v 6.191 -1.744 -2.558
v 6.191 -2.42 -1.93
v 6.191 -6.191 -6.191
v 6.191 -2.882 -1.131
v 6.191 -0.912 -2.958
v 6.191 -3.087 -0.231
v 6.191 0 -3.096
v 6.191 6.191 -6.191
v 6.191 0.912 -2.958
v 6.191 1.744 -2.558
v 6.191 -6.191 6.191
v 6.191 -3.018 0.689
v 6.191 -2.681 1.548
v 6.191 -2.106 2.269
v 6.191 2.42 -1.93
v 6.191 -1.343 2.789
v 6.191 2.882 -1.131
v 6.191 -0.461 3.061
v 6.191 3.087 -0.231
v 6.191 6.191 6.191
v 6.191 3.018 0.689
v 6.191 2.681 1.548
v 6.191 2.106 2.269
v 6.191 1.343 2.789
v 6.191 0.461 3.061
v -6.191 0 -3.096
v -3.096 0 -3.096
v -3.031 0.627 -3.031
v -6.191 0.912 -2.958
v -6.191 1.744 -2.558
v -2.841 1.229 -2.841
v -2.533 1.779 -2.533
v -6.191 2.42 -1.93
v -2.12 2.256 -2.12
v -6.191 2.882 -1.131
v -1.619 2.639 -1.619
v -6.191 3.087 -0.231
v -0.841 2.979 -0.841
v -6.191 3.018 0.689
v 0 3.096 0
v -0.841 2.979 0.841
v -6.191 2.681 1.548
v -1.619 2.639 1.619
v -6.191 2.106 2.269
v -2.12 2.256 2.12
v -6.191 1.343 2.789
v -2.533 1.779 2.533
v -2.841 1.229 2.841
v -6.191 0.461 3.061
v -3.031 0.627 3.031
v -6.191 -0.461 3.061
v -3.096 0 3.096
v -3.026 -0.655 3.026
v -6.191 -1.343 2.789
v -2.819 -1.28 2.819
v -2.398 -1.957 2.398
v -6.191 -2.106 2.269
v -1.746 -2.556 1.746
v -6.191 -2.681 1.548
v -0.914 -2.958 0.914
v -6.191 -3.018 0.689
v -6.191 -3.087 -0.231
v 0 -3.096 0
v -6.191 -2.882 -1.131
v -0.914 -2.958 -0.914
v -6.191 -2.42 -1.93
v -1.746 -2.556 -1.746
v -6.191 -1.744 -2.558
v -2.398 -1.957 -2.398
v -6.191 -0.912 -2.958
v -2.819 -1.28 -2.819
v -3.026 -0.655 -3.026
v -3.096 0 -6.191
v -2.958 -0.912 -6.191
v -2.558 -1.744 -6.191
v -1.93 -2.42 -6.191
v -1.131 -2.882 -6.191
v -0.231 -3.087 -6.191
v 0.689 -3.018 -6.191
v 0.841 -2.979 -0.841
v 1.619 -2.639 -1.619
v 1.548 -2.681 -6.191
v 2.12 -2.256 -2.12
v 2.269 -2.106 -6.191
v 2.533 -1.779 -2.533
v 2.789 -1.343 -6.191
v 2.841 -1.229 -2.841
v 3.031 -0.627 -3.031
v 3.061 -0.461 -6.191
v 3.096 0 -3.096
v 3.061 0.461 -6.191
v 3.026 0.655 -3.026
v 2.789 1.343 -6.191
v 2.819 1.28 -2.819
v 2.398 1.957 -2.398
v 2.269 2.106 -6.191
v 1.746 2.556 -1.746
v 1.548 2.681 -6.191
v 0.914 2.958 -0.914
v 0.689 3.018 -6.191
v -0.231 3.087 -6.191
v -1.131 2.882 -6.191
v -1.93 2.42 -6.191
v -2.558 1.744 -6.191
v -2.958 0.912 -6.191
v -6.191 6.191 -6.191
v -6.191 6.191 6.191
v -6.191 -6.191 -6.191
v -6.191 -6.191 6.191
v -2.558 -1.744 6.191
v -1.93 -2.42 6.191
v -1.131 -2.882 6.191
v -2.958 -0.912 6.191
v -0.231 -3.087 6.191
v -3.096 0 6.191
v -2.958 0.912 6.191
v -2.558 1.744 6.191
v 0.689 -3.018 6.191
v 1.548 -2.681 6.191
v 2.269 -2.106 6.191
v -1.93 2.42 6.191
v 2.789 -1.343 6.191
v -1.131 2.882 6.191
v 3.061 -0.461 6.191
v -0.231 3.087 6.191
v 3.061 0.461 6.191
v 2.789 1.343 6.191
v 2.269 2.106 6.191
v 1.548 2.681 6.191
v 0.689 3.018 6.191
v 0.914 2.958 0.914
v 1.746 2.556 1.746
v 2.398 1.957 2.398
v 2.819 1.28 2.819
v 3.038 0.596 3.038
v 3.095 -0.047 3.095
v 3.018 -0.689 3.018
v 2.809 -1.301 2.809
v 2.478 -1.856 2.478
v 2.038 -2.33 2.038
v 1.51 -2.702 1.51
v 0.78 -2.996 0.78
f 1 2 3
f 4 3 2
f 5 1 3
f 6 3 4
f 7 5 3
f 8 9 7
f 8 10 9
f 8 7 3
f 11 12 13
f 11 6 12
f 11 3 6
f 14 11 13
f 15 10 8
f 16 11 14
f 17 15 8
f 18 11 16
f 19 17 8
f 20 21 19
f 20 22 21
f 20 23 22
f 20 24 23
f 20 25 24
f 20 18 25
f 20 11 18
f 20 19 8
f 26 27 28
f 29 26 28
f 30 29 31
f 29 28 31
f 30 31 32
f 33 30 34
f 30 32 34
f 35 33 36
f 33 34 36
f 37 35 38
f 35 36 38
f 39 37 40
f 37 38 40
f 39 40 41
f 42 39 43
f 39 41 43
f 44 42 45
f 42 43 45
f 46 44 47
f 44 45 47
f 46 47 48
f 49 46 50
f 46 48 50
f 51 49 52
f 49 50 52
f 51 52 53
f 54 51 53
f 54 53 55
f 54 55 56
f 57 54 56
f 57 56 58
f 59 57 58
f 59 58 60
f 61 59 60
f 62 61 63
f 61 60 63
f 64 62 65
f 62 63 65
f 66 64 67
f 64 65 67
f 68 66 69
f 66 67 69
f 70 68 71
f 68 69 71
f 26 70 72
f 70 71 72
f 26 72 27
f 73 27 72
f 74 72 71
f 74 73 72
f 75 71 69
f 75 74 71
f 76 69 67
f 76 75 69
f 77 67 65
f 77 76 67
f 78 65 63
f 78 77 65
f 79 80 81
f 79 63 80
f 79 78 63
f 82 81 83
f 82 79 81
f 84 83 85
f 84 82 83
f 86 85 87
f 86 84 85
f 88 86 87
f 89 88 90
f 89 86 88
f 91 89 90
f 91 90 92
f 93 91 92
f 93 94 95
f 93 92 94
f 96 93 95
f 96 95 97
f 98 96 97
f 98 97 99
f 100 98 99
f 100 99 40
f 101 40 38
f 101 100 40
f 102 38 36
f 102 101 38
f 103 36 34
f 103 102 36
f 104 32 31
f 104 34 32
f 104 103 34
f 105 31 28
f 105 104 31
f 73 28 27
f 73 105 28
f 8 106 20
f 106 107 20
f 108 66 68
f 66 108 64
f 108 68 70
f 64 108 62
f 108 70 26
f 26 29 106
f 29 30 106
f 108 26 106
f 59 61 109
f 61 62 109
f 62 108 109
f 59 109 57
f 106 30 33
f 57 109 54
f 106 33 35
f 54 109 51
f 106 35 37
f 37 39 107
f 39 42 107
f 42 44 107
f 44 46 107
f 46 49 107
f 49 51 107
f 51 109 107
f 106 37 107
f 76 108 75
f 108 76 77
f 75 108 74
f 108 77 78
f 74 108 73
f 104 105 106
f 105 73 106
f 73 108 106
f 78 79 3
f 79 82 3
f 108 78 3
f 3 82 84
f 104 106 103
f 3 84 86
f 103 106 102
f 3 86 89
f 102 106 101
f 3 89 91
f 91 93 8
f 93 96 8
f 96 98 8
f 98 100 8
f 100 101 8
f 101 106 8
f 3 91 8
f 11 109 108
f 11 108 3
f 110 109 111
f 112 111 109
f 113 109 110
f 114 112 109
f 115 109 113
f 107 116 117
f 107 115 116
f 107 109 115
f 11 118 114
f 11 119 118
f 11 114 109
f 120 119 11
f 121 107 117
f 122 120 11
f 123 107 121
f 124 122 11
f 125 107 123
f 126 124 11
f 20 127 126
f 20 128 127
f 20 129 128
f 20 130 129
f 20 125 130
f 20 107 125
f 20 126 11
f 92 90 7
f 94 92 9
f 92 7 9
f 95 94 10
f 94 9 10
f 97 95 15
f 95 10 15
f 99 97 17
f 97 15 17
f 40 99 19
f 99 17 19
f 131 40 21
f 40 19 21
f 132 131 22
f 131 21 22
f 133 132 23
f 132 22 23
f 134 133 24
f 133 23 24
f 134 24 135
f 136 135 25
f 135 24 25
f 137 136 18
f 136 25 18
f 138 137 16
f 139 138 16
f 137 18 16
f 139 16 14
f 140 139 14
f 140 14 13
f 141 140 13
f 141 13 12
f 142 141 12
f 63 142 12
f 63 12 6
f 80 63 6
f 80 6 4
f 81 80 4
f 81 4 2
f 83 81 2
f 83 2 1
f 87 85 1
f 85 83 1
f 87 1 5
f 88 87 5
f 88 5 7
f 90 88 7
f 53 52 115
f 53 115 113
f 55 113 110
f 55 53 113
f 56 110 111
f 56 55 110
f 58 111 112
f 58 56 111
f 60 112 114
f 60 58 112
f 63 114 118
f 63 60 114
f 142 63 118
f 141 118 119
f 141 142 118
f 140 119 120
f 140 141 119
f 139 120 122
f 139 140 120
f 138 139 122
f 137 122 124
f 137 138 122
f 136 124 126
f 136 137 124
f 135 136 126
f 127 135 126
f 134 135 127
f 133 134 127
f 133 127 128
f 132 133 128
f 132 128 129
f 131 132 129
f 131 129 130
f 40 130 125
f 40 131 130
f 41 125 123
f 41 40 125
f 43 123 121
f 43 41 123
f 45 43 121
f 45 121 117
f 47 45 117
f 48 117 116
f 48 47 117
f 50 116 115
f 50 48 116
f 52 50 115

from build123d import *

# Parameters (mm, degrees)
SKETCH1_W          = 19.05
SKETCH1_H          = 19.05
SKETCH1_R          = 4.7625
BASE_EXTRUDE_DEPTH = 9.525
SKETCH3_R          = 4.7625
CUT_EXTRUDE1_DEPTH = 24.3313898
SCALE1_SCALE       = 0.65


with BuildPart() as part:
    # Sketch1 → Base-Extrude (new, symmetric)
    with BuildSketch(Plane.XY):
        Rectangle(SKETCH1_W, SKETCH1_H)
        with Locations(Location((0, 0, 0), (0, 0, 180))):
            Circle(SKETCH1_R, mode=Mode.SUBTRACT)
    extrude(amount=BASE_EXTRUDE_DEPTH, both=True)

    # Sketch3 → Cut-Extrude1 (cut, through all)
    with BuildSketch(Plane(origin=(9.525, 0, 0), x_dir=(0, 0, -1), z_dir=(1, 0, 0))):
        Circle(SKETCH3_R)
    extrude(amount=-CUT_EXTRUDE1_DEPTH, mode=Mode.SUBTRACT)


with BuildPart() as part_1:
    # Scale1: scaled about (0, 0, 0)
    add(part.part.scale(SCALE1_SCALE))


solid = part_1.part
